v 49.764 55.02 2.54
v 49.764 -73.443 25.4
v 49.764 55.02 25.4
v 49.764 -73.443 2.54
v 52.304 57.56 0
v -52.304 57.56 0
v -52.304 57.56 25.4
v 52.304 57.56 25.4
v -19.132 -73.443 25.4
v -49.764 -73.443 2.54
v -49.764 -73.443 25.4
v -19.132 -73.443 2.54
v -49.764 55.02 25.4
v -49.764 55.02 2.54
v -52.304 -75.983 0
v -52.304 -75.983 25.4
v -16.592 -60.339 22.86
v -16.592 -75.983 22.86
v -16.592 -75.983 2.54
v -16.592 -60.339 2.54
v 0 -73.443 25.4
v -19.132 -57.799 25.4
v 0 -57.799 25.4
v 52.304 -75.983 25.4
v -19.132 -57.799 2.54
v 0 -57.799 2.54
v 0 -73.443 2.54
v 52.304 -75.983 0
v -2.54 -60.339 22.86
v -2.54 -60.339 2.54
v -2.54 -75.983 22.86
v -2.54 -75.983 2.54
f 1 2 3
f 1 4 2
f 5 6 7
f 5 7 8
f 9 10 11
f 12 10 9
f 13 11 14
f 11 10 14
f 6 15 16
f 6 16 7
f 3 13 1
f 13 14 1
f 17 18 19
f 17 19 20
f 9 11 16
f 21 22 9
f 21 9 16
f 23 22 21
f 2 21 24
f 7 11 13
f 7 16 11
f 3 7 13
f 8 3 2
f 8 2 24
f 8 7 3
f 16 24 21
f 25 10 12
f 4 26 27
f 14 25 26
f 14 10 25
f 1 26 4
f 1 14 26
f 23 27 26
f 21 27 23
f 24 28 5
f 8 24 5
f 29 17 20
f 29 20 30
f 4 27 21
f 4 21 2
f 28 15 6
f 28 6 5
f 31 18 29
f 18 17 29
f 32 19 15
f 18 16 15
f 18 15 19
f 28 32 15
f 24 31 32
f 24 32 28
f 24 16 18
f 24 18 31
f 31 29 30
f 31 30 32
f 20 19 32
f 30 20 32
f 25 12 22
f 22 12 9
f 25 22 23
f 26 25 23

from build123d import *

# Parameters (mm, degrees)
F0_W         = 104.6088039875
F0_H         = 133.5426568985
F1_DEPTH     = 25.4
F2_T         = -2.54
F3_W         = 19.131584093
F3_H         = 25.4
F4_DEPTH     = 18.1840639561
F5_T         = 2.54
F5_T3_DEPTH  = 27.94
F5_T5_DEPTH  = 133.5426568985
F5_T7_DEPTH  = 104.6088039875
F5_T9_DEPTH  = 54.8444019938
F5_T11_DEPTH = 20.7240639561
F5_T13_DEPTH = 24.211584093
F5_T15_DEPTH = 35.7128179008


# Not quite as in the source:
# - a shell that OpenCascade refuses in one call is made with other operations: the cavity is built on its own and cut out


with BuildPart() as f1:
    # F0 (on Top) → F1 (new body)
    with BuildSketch(Plane.XY):
        with Locations((0, -9.2112720013)):
            Rectangle(F0_W, F0_H)
    extrude(amount=F1_DEPTH)

    # F2
    f2_openings = [f1.faces().sort_by_distance(p)[0] for p in [
        (0, -9.211272, 25.4),
    ]]
    offset(amount=F2_T, openings=f2_openings)

    # F3 (on face) → F4 (join)
    with BuildSketch(Plane.XZ.offset(75.9826004505)):
        with Locations((-9.5657920465, 12.7)):
            Rectangle(F3_W, F3_H)
    extrude(amount=-F4_DEPTH)

    # F5: shell of thickness 2.54, made by hand


with BuildPart() as f5_core1:
    # F5_t2: copy of F1
    add(f1.part)

    # the walls: a layer under each face that stays
    f5_faces = [f5_core1.faces().sort_by_distance(p)[0] for p in [
        (52.3044019938, -9.2112720013, 12.7),
        (-14.9441148554, -66.4438392435, 25.4),
        (49.7644019938, -9.2112720013, 13.97),
        (0, -9.2112720013, 2.54),
        (0, 55.020056448, 13.97),
        (-49.7644019938, -9.2112720013, 13.97),
        (-34.4479930434, -73.4426004505, 13.97),
        (-19.131584093, -65.6205684724, 13.97),
        (-9.5657920465, -57.7985364944, 13.97),
        (0, -65.6205684724, 13.97),
        (24.8822009969, -73.4426004505, 13.97),
        (-52.3044019938, -9.2112720013, 12.7),
        (0, -9.2112720013, 0),
        (0, 57.560056448, 12.7),
    ]]
    thicken(f5_faces, amount=-F5_T, mode=Mode.SUBTRACT)

    # F5_s4 → F5_t3 (cut)
    with BuildSketch(Plane.XY):
        Polygon((49.7390019938, 54.994656448), (52.3044019938, 55.020056448), (52.3044019938, 57.560056448), (49.7644019938, 57.560056448), align=None)
        Polygon((49.7390019938, -73.4172004505), (52.3044019938, -73.4426004505), (52.3044019938, -75.9826004505), (49.7644019938, -75.9826004505), align=None)
        Polygon((-49.7390019938, 54.994656448), (-49.7644019938, 57.560056448), (-52.3044019938, 57.560056448), (-52.3044019938, 55.020056448), align=None)
        Polygon((-49.7390019938, -73.4172004505), (-52.3044019938, -73.4426004505), (-52.3044019938, -75.9826004505), (-49.7644019938, -75.9826004505), align=None)
        Polygon((-19.156984093, -73.4172004505), (-19.131584093, -75.9826004505), (-16.591584093, -75.9826004505), (-16.591584093, -73.4426004505), align=None)
        Polygon((0.0254, -73.4172004505), (-2.54, -73.4426004505), (-2.54, -75.9826004505), (0, -75.9826004505), align=None)
    extrude(amount=F5_T3_DEPTH, mode=Mode.SUBTRACT)

    # F5_s6 → F5_t5 (cut)
    with BuildSketch(Plane.XZ.offset(-57.560056448)):
        Polygon((49.7390019938, 2.5654), (52.3044019938, 2.54), (52.3044019938, 0), (49.7644019938, 0), align=None)
        Polygon((-49.7390019938, 2.5654), (-49.7644019938, 0), (-52.3044019938, 0), (-52.3044019938, 2.54), align=None)
    extrude(amount=F5_T5_DEPTH, mode=Mode.SUBTRACT)

    # F5_s8 → F5_t7 (cut)
    with BuildSketch(Plane.YZ.offset(-52.3044019938)):
        Polygon((54.994656448, 2.5654), (55.020056448, 0), (57.560056448, 0), (57.560056448, 2.54), align=None)
    extrude(amount=F5_T7_DEPTH, mode=Mode.SUBTRACT)

    # F5_s10 → F5_t9 (cut)
    with BuildSketch(Plane.YZ.offset(-2.54)):
        Polygon((-73.4172004505, 2.5654), (-73.4426004505, 0), (-75.9826004505, 0), (-75.9826004505, 2.54), align=None)
    extrude(amount=F5_T9_DEPTH, mode=Mode.SUBTRACT)

    # F5_s12 → F5_t11 (cut)
    with BuildSketch(Plane.XZ.offset(55.2585364944)):
        Polygon((0.0254, 2.5654), (0, 0), (-2.54, 0), (-2.54, 2.54), align=None)
        Polygon((-19.156984093, 2.5654), (-19.131584093, 0), (-16.591584093, 0), (-16.591584093, 2.54), align=None)
    extrude(amount=F5_T11_DEPTH, mode=Mode.SUBTRACT)

    # F5_s14 → F5_t13 (cut)
    with BuildSketch(Plane.YZ.offset(-21.671584093)):
        Polygon((-57.7731364944, 2.5654), (-57.7985364944, 0), (-60.3385364944, 0), (-60.3385364944, 2.54), align=None)
    extrude(amount=F5_T13_DEPTH, mode=Mode.SUBTRACT)

    # F5_s16 → F5_t15 (cut)
    with BuildSketch(Plane.YZ.offset(-52.3044019938)):
        Polygon((-73.4172004505, 2.5654), (-73.4426004505, 0), (-75.9826004505, 0), (-75.9826004505, 2.54), align=None)
    extrude(amount=F5_T15_DEPTH, mode=Mode.SUBTRACT)


with BuildPart() as f1_1:
    add(f1.part)

    # what is left inside the walls is the cavity
    f5_cavity = [f5_core1.part.solids().sort_by_distance(p)[0] for p in [
        (-2.5654, -65.553224, 12.7),
    ]]
    add(f5_cavity, mode=Mode.SUBTRACT)


solid = f1_1.part
